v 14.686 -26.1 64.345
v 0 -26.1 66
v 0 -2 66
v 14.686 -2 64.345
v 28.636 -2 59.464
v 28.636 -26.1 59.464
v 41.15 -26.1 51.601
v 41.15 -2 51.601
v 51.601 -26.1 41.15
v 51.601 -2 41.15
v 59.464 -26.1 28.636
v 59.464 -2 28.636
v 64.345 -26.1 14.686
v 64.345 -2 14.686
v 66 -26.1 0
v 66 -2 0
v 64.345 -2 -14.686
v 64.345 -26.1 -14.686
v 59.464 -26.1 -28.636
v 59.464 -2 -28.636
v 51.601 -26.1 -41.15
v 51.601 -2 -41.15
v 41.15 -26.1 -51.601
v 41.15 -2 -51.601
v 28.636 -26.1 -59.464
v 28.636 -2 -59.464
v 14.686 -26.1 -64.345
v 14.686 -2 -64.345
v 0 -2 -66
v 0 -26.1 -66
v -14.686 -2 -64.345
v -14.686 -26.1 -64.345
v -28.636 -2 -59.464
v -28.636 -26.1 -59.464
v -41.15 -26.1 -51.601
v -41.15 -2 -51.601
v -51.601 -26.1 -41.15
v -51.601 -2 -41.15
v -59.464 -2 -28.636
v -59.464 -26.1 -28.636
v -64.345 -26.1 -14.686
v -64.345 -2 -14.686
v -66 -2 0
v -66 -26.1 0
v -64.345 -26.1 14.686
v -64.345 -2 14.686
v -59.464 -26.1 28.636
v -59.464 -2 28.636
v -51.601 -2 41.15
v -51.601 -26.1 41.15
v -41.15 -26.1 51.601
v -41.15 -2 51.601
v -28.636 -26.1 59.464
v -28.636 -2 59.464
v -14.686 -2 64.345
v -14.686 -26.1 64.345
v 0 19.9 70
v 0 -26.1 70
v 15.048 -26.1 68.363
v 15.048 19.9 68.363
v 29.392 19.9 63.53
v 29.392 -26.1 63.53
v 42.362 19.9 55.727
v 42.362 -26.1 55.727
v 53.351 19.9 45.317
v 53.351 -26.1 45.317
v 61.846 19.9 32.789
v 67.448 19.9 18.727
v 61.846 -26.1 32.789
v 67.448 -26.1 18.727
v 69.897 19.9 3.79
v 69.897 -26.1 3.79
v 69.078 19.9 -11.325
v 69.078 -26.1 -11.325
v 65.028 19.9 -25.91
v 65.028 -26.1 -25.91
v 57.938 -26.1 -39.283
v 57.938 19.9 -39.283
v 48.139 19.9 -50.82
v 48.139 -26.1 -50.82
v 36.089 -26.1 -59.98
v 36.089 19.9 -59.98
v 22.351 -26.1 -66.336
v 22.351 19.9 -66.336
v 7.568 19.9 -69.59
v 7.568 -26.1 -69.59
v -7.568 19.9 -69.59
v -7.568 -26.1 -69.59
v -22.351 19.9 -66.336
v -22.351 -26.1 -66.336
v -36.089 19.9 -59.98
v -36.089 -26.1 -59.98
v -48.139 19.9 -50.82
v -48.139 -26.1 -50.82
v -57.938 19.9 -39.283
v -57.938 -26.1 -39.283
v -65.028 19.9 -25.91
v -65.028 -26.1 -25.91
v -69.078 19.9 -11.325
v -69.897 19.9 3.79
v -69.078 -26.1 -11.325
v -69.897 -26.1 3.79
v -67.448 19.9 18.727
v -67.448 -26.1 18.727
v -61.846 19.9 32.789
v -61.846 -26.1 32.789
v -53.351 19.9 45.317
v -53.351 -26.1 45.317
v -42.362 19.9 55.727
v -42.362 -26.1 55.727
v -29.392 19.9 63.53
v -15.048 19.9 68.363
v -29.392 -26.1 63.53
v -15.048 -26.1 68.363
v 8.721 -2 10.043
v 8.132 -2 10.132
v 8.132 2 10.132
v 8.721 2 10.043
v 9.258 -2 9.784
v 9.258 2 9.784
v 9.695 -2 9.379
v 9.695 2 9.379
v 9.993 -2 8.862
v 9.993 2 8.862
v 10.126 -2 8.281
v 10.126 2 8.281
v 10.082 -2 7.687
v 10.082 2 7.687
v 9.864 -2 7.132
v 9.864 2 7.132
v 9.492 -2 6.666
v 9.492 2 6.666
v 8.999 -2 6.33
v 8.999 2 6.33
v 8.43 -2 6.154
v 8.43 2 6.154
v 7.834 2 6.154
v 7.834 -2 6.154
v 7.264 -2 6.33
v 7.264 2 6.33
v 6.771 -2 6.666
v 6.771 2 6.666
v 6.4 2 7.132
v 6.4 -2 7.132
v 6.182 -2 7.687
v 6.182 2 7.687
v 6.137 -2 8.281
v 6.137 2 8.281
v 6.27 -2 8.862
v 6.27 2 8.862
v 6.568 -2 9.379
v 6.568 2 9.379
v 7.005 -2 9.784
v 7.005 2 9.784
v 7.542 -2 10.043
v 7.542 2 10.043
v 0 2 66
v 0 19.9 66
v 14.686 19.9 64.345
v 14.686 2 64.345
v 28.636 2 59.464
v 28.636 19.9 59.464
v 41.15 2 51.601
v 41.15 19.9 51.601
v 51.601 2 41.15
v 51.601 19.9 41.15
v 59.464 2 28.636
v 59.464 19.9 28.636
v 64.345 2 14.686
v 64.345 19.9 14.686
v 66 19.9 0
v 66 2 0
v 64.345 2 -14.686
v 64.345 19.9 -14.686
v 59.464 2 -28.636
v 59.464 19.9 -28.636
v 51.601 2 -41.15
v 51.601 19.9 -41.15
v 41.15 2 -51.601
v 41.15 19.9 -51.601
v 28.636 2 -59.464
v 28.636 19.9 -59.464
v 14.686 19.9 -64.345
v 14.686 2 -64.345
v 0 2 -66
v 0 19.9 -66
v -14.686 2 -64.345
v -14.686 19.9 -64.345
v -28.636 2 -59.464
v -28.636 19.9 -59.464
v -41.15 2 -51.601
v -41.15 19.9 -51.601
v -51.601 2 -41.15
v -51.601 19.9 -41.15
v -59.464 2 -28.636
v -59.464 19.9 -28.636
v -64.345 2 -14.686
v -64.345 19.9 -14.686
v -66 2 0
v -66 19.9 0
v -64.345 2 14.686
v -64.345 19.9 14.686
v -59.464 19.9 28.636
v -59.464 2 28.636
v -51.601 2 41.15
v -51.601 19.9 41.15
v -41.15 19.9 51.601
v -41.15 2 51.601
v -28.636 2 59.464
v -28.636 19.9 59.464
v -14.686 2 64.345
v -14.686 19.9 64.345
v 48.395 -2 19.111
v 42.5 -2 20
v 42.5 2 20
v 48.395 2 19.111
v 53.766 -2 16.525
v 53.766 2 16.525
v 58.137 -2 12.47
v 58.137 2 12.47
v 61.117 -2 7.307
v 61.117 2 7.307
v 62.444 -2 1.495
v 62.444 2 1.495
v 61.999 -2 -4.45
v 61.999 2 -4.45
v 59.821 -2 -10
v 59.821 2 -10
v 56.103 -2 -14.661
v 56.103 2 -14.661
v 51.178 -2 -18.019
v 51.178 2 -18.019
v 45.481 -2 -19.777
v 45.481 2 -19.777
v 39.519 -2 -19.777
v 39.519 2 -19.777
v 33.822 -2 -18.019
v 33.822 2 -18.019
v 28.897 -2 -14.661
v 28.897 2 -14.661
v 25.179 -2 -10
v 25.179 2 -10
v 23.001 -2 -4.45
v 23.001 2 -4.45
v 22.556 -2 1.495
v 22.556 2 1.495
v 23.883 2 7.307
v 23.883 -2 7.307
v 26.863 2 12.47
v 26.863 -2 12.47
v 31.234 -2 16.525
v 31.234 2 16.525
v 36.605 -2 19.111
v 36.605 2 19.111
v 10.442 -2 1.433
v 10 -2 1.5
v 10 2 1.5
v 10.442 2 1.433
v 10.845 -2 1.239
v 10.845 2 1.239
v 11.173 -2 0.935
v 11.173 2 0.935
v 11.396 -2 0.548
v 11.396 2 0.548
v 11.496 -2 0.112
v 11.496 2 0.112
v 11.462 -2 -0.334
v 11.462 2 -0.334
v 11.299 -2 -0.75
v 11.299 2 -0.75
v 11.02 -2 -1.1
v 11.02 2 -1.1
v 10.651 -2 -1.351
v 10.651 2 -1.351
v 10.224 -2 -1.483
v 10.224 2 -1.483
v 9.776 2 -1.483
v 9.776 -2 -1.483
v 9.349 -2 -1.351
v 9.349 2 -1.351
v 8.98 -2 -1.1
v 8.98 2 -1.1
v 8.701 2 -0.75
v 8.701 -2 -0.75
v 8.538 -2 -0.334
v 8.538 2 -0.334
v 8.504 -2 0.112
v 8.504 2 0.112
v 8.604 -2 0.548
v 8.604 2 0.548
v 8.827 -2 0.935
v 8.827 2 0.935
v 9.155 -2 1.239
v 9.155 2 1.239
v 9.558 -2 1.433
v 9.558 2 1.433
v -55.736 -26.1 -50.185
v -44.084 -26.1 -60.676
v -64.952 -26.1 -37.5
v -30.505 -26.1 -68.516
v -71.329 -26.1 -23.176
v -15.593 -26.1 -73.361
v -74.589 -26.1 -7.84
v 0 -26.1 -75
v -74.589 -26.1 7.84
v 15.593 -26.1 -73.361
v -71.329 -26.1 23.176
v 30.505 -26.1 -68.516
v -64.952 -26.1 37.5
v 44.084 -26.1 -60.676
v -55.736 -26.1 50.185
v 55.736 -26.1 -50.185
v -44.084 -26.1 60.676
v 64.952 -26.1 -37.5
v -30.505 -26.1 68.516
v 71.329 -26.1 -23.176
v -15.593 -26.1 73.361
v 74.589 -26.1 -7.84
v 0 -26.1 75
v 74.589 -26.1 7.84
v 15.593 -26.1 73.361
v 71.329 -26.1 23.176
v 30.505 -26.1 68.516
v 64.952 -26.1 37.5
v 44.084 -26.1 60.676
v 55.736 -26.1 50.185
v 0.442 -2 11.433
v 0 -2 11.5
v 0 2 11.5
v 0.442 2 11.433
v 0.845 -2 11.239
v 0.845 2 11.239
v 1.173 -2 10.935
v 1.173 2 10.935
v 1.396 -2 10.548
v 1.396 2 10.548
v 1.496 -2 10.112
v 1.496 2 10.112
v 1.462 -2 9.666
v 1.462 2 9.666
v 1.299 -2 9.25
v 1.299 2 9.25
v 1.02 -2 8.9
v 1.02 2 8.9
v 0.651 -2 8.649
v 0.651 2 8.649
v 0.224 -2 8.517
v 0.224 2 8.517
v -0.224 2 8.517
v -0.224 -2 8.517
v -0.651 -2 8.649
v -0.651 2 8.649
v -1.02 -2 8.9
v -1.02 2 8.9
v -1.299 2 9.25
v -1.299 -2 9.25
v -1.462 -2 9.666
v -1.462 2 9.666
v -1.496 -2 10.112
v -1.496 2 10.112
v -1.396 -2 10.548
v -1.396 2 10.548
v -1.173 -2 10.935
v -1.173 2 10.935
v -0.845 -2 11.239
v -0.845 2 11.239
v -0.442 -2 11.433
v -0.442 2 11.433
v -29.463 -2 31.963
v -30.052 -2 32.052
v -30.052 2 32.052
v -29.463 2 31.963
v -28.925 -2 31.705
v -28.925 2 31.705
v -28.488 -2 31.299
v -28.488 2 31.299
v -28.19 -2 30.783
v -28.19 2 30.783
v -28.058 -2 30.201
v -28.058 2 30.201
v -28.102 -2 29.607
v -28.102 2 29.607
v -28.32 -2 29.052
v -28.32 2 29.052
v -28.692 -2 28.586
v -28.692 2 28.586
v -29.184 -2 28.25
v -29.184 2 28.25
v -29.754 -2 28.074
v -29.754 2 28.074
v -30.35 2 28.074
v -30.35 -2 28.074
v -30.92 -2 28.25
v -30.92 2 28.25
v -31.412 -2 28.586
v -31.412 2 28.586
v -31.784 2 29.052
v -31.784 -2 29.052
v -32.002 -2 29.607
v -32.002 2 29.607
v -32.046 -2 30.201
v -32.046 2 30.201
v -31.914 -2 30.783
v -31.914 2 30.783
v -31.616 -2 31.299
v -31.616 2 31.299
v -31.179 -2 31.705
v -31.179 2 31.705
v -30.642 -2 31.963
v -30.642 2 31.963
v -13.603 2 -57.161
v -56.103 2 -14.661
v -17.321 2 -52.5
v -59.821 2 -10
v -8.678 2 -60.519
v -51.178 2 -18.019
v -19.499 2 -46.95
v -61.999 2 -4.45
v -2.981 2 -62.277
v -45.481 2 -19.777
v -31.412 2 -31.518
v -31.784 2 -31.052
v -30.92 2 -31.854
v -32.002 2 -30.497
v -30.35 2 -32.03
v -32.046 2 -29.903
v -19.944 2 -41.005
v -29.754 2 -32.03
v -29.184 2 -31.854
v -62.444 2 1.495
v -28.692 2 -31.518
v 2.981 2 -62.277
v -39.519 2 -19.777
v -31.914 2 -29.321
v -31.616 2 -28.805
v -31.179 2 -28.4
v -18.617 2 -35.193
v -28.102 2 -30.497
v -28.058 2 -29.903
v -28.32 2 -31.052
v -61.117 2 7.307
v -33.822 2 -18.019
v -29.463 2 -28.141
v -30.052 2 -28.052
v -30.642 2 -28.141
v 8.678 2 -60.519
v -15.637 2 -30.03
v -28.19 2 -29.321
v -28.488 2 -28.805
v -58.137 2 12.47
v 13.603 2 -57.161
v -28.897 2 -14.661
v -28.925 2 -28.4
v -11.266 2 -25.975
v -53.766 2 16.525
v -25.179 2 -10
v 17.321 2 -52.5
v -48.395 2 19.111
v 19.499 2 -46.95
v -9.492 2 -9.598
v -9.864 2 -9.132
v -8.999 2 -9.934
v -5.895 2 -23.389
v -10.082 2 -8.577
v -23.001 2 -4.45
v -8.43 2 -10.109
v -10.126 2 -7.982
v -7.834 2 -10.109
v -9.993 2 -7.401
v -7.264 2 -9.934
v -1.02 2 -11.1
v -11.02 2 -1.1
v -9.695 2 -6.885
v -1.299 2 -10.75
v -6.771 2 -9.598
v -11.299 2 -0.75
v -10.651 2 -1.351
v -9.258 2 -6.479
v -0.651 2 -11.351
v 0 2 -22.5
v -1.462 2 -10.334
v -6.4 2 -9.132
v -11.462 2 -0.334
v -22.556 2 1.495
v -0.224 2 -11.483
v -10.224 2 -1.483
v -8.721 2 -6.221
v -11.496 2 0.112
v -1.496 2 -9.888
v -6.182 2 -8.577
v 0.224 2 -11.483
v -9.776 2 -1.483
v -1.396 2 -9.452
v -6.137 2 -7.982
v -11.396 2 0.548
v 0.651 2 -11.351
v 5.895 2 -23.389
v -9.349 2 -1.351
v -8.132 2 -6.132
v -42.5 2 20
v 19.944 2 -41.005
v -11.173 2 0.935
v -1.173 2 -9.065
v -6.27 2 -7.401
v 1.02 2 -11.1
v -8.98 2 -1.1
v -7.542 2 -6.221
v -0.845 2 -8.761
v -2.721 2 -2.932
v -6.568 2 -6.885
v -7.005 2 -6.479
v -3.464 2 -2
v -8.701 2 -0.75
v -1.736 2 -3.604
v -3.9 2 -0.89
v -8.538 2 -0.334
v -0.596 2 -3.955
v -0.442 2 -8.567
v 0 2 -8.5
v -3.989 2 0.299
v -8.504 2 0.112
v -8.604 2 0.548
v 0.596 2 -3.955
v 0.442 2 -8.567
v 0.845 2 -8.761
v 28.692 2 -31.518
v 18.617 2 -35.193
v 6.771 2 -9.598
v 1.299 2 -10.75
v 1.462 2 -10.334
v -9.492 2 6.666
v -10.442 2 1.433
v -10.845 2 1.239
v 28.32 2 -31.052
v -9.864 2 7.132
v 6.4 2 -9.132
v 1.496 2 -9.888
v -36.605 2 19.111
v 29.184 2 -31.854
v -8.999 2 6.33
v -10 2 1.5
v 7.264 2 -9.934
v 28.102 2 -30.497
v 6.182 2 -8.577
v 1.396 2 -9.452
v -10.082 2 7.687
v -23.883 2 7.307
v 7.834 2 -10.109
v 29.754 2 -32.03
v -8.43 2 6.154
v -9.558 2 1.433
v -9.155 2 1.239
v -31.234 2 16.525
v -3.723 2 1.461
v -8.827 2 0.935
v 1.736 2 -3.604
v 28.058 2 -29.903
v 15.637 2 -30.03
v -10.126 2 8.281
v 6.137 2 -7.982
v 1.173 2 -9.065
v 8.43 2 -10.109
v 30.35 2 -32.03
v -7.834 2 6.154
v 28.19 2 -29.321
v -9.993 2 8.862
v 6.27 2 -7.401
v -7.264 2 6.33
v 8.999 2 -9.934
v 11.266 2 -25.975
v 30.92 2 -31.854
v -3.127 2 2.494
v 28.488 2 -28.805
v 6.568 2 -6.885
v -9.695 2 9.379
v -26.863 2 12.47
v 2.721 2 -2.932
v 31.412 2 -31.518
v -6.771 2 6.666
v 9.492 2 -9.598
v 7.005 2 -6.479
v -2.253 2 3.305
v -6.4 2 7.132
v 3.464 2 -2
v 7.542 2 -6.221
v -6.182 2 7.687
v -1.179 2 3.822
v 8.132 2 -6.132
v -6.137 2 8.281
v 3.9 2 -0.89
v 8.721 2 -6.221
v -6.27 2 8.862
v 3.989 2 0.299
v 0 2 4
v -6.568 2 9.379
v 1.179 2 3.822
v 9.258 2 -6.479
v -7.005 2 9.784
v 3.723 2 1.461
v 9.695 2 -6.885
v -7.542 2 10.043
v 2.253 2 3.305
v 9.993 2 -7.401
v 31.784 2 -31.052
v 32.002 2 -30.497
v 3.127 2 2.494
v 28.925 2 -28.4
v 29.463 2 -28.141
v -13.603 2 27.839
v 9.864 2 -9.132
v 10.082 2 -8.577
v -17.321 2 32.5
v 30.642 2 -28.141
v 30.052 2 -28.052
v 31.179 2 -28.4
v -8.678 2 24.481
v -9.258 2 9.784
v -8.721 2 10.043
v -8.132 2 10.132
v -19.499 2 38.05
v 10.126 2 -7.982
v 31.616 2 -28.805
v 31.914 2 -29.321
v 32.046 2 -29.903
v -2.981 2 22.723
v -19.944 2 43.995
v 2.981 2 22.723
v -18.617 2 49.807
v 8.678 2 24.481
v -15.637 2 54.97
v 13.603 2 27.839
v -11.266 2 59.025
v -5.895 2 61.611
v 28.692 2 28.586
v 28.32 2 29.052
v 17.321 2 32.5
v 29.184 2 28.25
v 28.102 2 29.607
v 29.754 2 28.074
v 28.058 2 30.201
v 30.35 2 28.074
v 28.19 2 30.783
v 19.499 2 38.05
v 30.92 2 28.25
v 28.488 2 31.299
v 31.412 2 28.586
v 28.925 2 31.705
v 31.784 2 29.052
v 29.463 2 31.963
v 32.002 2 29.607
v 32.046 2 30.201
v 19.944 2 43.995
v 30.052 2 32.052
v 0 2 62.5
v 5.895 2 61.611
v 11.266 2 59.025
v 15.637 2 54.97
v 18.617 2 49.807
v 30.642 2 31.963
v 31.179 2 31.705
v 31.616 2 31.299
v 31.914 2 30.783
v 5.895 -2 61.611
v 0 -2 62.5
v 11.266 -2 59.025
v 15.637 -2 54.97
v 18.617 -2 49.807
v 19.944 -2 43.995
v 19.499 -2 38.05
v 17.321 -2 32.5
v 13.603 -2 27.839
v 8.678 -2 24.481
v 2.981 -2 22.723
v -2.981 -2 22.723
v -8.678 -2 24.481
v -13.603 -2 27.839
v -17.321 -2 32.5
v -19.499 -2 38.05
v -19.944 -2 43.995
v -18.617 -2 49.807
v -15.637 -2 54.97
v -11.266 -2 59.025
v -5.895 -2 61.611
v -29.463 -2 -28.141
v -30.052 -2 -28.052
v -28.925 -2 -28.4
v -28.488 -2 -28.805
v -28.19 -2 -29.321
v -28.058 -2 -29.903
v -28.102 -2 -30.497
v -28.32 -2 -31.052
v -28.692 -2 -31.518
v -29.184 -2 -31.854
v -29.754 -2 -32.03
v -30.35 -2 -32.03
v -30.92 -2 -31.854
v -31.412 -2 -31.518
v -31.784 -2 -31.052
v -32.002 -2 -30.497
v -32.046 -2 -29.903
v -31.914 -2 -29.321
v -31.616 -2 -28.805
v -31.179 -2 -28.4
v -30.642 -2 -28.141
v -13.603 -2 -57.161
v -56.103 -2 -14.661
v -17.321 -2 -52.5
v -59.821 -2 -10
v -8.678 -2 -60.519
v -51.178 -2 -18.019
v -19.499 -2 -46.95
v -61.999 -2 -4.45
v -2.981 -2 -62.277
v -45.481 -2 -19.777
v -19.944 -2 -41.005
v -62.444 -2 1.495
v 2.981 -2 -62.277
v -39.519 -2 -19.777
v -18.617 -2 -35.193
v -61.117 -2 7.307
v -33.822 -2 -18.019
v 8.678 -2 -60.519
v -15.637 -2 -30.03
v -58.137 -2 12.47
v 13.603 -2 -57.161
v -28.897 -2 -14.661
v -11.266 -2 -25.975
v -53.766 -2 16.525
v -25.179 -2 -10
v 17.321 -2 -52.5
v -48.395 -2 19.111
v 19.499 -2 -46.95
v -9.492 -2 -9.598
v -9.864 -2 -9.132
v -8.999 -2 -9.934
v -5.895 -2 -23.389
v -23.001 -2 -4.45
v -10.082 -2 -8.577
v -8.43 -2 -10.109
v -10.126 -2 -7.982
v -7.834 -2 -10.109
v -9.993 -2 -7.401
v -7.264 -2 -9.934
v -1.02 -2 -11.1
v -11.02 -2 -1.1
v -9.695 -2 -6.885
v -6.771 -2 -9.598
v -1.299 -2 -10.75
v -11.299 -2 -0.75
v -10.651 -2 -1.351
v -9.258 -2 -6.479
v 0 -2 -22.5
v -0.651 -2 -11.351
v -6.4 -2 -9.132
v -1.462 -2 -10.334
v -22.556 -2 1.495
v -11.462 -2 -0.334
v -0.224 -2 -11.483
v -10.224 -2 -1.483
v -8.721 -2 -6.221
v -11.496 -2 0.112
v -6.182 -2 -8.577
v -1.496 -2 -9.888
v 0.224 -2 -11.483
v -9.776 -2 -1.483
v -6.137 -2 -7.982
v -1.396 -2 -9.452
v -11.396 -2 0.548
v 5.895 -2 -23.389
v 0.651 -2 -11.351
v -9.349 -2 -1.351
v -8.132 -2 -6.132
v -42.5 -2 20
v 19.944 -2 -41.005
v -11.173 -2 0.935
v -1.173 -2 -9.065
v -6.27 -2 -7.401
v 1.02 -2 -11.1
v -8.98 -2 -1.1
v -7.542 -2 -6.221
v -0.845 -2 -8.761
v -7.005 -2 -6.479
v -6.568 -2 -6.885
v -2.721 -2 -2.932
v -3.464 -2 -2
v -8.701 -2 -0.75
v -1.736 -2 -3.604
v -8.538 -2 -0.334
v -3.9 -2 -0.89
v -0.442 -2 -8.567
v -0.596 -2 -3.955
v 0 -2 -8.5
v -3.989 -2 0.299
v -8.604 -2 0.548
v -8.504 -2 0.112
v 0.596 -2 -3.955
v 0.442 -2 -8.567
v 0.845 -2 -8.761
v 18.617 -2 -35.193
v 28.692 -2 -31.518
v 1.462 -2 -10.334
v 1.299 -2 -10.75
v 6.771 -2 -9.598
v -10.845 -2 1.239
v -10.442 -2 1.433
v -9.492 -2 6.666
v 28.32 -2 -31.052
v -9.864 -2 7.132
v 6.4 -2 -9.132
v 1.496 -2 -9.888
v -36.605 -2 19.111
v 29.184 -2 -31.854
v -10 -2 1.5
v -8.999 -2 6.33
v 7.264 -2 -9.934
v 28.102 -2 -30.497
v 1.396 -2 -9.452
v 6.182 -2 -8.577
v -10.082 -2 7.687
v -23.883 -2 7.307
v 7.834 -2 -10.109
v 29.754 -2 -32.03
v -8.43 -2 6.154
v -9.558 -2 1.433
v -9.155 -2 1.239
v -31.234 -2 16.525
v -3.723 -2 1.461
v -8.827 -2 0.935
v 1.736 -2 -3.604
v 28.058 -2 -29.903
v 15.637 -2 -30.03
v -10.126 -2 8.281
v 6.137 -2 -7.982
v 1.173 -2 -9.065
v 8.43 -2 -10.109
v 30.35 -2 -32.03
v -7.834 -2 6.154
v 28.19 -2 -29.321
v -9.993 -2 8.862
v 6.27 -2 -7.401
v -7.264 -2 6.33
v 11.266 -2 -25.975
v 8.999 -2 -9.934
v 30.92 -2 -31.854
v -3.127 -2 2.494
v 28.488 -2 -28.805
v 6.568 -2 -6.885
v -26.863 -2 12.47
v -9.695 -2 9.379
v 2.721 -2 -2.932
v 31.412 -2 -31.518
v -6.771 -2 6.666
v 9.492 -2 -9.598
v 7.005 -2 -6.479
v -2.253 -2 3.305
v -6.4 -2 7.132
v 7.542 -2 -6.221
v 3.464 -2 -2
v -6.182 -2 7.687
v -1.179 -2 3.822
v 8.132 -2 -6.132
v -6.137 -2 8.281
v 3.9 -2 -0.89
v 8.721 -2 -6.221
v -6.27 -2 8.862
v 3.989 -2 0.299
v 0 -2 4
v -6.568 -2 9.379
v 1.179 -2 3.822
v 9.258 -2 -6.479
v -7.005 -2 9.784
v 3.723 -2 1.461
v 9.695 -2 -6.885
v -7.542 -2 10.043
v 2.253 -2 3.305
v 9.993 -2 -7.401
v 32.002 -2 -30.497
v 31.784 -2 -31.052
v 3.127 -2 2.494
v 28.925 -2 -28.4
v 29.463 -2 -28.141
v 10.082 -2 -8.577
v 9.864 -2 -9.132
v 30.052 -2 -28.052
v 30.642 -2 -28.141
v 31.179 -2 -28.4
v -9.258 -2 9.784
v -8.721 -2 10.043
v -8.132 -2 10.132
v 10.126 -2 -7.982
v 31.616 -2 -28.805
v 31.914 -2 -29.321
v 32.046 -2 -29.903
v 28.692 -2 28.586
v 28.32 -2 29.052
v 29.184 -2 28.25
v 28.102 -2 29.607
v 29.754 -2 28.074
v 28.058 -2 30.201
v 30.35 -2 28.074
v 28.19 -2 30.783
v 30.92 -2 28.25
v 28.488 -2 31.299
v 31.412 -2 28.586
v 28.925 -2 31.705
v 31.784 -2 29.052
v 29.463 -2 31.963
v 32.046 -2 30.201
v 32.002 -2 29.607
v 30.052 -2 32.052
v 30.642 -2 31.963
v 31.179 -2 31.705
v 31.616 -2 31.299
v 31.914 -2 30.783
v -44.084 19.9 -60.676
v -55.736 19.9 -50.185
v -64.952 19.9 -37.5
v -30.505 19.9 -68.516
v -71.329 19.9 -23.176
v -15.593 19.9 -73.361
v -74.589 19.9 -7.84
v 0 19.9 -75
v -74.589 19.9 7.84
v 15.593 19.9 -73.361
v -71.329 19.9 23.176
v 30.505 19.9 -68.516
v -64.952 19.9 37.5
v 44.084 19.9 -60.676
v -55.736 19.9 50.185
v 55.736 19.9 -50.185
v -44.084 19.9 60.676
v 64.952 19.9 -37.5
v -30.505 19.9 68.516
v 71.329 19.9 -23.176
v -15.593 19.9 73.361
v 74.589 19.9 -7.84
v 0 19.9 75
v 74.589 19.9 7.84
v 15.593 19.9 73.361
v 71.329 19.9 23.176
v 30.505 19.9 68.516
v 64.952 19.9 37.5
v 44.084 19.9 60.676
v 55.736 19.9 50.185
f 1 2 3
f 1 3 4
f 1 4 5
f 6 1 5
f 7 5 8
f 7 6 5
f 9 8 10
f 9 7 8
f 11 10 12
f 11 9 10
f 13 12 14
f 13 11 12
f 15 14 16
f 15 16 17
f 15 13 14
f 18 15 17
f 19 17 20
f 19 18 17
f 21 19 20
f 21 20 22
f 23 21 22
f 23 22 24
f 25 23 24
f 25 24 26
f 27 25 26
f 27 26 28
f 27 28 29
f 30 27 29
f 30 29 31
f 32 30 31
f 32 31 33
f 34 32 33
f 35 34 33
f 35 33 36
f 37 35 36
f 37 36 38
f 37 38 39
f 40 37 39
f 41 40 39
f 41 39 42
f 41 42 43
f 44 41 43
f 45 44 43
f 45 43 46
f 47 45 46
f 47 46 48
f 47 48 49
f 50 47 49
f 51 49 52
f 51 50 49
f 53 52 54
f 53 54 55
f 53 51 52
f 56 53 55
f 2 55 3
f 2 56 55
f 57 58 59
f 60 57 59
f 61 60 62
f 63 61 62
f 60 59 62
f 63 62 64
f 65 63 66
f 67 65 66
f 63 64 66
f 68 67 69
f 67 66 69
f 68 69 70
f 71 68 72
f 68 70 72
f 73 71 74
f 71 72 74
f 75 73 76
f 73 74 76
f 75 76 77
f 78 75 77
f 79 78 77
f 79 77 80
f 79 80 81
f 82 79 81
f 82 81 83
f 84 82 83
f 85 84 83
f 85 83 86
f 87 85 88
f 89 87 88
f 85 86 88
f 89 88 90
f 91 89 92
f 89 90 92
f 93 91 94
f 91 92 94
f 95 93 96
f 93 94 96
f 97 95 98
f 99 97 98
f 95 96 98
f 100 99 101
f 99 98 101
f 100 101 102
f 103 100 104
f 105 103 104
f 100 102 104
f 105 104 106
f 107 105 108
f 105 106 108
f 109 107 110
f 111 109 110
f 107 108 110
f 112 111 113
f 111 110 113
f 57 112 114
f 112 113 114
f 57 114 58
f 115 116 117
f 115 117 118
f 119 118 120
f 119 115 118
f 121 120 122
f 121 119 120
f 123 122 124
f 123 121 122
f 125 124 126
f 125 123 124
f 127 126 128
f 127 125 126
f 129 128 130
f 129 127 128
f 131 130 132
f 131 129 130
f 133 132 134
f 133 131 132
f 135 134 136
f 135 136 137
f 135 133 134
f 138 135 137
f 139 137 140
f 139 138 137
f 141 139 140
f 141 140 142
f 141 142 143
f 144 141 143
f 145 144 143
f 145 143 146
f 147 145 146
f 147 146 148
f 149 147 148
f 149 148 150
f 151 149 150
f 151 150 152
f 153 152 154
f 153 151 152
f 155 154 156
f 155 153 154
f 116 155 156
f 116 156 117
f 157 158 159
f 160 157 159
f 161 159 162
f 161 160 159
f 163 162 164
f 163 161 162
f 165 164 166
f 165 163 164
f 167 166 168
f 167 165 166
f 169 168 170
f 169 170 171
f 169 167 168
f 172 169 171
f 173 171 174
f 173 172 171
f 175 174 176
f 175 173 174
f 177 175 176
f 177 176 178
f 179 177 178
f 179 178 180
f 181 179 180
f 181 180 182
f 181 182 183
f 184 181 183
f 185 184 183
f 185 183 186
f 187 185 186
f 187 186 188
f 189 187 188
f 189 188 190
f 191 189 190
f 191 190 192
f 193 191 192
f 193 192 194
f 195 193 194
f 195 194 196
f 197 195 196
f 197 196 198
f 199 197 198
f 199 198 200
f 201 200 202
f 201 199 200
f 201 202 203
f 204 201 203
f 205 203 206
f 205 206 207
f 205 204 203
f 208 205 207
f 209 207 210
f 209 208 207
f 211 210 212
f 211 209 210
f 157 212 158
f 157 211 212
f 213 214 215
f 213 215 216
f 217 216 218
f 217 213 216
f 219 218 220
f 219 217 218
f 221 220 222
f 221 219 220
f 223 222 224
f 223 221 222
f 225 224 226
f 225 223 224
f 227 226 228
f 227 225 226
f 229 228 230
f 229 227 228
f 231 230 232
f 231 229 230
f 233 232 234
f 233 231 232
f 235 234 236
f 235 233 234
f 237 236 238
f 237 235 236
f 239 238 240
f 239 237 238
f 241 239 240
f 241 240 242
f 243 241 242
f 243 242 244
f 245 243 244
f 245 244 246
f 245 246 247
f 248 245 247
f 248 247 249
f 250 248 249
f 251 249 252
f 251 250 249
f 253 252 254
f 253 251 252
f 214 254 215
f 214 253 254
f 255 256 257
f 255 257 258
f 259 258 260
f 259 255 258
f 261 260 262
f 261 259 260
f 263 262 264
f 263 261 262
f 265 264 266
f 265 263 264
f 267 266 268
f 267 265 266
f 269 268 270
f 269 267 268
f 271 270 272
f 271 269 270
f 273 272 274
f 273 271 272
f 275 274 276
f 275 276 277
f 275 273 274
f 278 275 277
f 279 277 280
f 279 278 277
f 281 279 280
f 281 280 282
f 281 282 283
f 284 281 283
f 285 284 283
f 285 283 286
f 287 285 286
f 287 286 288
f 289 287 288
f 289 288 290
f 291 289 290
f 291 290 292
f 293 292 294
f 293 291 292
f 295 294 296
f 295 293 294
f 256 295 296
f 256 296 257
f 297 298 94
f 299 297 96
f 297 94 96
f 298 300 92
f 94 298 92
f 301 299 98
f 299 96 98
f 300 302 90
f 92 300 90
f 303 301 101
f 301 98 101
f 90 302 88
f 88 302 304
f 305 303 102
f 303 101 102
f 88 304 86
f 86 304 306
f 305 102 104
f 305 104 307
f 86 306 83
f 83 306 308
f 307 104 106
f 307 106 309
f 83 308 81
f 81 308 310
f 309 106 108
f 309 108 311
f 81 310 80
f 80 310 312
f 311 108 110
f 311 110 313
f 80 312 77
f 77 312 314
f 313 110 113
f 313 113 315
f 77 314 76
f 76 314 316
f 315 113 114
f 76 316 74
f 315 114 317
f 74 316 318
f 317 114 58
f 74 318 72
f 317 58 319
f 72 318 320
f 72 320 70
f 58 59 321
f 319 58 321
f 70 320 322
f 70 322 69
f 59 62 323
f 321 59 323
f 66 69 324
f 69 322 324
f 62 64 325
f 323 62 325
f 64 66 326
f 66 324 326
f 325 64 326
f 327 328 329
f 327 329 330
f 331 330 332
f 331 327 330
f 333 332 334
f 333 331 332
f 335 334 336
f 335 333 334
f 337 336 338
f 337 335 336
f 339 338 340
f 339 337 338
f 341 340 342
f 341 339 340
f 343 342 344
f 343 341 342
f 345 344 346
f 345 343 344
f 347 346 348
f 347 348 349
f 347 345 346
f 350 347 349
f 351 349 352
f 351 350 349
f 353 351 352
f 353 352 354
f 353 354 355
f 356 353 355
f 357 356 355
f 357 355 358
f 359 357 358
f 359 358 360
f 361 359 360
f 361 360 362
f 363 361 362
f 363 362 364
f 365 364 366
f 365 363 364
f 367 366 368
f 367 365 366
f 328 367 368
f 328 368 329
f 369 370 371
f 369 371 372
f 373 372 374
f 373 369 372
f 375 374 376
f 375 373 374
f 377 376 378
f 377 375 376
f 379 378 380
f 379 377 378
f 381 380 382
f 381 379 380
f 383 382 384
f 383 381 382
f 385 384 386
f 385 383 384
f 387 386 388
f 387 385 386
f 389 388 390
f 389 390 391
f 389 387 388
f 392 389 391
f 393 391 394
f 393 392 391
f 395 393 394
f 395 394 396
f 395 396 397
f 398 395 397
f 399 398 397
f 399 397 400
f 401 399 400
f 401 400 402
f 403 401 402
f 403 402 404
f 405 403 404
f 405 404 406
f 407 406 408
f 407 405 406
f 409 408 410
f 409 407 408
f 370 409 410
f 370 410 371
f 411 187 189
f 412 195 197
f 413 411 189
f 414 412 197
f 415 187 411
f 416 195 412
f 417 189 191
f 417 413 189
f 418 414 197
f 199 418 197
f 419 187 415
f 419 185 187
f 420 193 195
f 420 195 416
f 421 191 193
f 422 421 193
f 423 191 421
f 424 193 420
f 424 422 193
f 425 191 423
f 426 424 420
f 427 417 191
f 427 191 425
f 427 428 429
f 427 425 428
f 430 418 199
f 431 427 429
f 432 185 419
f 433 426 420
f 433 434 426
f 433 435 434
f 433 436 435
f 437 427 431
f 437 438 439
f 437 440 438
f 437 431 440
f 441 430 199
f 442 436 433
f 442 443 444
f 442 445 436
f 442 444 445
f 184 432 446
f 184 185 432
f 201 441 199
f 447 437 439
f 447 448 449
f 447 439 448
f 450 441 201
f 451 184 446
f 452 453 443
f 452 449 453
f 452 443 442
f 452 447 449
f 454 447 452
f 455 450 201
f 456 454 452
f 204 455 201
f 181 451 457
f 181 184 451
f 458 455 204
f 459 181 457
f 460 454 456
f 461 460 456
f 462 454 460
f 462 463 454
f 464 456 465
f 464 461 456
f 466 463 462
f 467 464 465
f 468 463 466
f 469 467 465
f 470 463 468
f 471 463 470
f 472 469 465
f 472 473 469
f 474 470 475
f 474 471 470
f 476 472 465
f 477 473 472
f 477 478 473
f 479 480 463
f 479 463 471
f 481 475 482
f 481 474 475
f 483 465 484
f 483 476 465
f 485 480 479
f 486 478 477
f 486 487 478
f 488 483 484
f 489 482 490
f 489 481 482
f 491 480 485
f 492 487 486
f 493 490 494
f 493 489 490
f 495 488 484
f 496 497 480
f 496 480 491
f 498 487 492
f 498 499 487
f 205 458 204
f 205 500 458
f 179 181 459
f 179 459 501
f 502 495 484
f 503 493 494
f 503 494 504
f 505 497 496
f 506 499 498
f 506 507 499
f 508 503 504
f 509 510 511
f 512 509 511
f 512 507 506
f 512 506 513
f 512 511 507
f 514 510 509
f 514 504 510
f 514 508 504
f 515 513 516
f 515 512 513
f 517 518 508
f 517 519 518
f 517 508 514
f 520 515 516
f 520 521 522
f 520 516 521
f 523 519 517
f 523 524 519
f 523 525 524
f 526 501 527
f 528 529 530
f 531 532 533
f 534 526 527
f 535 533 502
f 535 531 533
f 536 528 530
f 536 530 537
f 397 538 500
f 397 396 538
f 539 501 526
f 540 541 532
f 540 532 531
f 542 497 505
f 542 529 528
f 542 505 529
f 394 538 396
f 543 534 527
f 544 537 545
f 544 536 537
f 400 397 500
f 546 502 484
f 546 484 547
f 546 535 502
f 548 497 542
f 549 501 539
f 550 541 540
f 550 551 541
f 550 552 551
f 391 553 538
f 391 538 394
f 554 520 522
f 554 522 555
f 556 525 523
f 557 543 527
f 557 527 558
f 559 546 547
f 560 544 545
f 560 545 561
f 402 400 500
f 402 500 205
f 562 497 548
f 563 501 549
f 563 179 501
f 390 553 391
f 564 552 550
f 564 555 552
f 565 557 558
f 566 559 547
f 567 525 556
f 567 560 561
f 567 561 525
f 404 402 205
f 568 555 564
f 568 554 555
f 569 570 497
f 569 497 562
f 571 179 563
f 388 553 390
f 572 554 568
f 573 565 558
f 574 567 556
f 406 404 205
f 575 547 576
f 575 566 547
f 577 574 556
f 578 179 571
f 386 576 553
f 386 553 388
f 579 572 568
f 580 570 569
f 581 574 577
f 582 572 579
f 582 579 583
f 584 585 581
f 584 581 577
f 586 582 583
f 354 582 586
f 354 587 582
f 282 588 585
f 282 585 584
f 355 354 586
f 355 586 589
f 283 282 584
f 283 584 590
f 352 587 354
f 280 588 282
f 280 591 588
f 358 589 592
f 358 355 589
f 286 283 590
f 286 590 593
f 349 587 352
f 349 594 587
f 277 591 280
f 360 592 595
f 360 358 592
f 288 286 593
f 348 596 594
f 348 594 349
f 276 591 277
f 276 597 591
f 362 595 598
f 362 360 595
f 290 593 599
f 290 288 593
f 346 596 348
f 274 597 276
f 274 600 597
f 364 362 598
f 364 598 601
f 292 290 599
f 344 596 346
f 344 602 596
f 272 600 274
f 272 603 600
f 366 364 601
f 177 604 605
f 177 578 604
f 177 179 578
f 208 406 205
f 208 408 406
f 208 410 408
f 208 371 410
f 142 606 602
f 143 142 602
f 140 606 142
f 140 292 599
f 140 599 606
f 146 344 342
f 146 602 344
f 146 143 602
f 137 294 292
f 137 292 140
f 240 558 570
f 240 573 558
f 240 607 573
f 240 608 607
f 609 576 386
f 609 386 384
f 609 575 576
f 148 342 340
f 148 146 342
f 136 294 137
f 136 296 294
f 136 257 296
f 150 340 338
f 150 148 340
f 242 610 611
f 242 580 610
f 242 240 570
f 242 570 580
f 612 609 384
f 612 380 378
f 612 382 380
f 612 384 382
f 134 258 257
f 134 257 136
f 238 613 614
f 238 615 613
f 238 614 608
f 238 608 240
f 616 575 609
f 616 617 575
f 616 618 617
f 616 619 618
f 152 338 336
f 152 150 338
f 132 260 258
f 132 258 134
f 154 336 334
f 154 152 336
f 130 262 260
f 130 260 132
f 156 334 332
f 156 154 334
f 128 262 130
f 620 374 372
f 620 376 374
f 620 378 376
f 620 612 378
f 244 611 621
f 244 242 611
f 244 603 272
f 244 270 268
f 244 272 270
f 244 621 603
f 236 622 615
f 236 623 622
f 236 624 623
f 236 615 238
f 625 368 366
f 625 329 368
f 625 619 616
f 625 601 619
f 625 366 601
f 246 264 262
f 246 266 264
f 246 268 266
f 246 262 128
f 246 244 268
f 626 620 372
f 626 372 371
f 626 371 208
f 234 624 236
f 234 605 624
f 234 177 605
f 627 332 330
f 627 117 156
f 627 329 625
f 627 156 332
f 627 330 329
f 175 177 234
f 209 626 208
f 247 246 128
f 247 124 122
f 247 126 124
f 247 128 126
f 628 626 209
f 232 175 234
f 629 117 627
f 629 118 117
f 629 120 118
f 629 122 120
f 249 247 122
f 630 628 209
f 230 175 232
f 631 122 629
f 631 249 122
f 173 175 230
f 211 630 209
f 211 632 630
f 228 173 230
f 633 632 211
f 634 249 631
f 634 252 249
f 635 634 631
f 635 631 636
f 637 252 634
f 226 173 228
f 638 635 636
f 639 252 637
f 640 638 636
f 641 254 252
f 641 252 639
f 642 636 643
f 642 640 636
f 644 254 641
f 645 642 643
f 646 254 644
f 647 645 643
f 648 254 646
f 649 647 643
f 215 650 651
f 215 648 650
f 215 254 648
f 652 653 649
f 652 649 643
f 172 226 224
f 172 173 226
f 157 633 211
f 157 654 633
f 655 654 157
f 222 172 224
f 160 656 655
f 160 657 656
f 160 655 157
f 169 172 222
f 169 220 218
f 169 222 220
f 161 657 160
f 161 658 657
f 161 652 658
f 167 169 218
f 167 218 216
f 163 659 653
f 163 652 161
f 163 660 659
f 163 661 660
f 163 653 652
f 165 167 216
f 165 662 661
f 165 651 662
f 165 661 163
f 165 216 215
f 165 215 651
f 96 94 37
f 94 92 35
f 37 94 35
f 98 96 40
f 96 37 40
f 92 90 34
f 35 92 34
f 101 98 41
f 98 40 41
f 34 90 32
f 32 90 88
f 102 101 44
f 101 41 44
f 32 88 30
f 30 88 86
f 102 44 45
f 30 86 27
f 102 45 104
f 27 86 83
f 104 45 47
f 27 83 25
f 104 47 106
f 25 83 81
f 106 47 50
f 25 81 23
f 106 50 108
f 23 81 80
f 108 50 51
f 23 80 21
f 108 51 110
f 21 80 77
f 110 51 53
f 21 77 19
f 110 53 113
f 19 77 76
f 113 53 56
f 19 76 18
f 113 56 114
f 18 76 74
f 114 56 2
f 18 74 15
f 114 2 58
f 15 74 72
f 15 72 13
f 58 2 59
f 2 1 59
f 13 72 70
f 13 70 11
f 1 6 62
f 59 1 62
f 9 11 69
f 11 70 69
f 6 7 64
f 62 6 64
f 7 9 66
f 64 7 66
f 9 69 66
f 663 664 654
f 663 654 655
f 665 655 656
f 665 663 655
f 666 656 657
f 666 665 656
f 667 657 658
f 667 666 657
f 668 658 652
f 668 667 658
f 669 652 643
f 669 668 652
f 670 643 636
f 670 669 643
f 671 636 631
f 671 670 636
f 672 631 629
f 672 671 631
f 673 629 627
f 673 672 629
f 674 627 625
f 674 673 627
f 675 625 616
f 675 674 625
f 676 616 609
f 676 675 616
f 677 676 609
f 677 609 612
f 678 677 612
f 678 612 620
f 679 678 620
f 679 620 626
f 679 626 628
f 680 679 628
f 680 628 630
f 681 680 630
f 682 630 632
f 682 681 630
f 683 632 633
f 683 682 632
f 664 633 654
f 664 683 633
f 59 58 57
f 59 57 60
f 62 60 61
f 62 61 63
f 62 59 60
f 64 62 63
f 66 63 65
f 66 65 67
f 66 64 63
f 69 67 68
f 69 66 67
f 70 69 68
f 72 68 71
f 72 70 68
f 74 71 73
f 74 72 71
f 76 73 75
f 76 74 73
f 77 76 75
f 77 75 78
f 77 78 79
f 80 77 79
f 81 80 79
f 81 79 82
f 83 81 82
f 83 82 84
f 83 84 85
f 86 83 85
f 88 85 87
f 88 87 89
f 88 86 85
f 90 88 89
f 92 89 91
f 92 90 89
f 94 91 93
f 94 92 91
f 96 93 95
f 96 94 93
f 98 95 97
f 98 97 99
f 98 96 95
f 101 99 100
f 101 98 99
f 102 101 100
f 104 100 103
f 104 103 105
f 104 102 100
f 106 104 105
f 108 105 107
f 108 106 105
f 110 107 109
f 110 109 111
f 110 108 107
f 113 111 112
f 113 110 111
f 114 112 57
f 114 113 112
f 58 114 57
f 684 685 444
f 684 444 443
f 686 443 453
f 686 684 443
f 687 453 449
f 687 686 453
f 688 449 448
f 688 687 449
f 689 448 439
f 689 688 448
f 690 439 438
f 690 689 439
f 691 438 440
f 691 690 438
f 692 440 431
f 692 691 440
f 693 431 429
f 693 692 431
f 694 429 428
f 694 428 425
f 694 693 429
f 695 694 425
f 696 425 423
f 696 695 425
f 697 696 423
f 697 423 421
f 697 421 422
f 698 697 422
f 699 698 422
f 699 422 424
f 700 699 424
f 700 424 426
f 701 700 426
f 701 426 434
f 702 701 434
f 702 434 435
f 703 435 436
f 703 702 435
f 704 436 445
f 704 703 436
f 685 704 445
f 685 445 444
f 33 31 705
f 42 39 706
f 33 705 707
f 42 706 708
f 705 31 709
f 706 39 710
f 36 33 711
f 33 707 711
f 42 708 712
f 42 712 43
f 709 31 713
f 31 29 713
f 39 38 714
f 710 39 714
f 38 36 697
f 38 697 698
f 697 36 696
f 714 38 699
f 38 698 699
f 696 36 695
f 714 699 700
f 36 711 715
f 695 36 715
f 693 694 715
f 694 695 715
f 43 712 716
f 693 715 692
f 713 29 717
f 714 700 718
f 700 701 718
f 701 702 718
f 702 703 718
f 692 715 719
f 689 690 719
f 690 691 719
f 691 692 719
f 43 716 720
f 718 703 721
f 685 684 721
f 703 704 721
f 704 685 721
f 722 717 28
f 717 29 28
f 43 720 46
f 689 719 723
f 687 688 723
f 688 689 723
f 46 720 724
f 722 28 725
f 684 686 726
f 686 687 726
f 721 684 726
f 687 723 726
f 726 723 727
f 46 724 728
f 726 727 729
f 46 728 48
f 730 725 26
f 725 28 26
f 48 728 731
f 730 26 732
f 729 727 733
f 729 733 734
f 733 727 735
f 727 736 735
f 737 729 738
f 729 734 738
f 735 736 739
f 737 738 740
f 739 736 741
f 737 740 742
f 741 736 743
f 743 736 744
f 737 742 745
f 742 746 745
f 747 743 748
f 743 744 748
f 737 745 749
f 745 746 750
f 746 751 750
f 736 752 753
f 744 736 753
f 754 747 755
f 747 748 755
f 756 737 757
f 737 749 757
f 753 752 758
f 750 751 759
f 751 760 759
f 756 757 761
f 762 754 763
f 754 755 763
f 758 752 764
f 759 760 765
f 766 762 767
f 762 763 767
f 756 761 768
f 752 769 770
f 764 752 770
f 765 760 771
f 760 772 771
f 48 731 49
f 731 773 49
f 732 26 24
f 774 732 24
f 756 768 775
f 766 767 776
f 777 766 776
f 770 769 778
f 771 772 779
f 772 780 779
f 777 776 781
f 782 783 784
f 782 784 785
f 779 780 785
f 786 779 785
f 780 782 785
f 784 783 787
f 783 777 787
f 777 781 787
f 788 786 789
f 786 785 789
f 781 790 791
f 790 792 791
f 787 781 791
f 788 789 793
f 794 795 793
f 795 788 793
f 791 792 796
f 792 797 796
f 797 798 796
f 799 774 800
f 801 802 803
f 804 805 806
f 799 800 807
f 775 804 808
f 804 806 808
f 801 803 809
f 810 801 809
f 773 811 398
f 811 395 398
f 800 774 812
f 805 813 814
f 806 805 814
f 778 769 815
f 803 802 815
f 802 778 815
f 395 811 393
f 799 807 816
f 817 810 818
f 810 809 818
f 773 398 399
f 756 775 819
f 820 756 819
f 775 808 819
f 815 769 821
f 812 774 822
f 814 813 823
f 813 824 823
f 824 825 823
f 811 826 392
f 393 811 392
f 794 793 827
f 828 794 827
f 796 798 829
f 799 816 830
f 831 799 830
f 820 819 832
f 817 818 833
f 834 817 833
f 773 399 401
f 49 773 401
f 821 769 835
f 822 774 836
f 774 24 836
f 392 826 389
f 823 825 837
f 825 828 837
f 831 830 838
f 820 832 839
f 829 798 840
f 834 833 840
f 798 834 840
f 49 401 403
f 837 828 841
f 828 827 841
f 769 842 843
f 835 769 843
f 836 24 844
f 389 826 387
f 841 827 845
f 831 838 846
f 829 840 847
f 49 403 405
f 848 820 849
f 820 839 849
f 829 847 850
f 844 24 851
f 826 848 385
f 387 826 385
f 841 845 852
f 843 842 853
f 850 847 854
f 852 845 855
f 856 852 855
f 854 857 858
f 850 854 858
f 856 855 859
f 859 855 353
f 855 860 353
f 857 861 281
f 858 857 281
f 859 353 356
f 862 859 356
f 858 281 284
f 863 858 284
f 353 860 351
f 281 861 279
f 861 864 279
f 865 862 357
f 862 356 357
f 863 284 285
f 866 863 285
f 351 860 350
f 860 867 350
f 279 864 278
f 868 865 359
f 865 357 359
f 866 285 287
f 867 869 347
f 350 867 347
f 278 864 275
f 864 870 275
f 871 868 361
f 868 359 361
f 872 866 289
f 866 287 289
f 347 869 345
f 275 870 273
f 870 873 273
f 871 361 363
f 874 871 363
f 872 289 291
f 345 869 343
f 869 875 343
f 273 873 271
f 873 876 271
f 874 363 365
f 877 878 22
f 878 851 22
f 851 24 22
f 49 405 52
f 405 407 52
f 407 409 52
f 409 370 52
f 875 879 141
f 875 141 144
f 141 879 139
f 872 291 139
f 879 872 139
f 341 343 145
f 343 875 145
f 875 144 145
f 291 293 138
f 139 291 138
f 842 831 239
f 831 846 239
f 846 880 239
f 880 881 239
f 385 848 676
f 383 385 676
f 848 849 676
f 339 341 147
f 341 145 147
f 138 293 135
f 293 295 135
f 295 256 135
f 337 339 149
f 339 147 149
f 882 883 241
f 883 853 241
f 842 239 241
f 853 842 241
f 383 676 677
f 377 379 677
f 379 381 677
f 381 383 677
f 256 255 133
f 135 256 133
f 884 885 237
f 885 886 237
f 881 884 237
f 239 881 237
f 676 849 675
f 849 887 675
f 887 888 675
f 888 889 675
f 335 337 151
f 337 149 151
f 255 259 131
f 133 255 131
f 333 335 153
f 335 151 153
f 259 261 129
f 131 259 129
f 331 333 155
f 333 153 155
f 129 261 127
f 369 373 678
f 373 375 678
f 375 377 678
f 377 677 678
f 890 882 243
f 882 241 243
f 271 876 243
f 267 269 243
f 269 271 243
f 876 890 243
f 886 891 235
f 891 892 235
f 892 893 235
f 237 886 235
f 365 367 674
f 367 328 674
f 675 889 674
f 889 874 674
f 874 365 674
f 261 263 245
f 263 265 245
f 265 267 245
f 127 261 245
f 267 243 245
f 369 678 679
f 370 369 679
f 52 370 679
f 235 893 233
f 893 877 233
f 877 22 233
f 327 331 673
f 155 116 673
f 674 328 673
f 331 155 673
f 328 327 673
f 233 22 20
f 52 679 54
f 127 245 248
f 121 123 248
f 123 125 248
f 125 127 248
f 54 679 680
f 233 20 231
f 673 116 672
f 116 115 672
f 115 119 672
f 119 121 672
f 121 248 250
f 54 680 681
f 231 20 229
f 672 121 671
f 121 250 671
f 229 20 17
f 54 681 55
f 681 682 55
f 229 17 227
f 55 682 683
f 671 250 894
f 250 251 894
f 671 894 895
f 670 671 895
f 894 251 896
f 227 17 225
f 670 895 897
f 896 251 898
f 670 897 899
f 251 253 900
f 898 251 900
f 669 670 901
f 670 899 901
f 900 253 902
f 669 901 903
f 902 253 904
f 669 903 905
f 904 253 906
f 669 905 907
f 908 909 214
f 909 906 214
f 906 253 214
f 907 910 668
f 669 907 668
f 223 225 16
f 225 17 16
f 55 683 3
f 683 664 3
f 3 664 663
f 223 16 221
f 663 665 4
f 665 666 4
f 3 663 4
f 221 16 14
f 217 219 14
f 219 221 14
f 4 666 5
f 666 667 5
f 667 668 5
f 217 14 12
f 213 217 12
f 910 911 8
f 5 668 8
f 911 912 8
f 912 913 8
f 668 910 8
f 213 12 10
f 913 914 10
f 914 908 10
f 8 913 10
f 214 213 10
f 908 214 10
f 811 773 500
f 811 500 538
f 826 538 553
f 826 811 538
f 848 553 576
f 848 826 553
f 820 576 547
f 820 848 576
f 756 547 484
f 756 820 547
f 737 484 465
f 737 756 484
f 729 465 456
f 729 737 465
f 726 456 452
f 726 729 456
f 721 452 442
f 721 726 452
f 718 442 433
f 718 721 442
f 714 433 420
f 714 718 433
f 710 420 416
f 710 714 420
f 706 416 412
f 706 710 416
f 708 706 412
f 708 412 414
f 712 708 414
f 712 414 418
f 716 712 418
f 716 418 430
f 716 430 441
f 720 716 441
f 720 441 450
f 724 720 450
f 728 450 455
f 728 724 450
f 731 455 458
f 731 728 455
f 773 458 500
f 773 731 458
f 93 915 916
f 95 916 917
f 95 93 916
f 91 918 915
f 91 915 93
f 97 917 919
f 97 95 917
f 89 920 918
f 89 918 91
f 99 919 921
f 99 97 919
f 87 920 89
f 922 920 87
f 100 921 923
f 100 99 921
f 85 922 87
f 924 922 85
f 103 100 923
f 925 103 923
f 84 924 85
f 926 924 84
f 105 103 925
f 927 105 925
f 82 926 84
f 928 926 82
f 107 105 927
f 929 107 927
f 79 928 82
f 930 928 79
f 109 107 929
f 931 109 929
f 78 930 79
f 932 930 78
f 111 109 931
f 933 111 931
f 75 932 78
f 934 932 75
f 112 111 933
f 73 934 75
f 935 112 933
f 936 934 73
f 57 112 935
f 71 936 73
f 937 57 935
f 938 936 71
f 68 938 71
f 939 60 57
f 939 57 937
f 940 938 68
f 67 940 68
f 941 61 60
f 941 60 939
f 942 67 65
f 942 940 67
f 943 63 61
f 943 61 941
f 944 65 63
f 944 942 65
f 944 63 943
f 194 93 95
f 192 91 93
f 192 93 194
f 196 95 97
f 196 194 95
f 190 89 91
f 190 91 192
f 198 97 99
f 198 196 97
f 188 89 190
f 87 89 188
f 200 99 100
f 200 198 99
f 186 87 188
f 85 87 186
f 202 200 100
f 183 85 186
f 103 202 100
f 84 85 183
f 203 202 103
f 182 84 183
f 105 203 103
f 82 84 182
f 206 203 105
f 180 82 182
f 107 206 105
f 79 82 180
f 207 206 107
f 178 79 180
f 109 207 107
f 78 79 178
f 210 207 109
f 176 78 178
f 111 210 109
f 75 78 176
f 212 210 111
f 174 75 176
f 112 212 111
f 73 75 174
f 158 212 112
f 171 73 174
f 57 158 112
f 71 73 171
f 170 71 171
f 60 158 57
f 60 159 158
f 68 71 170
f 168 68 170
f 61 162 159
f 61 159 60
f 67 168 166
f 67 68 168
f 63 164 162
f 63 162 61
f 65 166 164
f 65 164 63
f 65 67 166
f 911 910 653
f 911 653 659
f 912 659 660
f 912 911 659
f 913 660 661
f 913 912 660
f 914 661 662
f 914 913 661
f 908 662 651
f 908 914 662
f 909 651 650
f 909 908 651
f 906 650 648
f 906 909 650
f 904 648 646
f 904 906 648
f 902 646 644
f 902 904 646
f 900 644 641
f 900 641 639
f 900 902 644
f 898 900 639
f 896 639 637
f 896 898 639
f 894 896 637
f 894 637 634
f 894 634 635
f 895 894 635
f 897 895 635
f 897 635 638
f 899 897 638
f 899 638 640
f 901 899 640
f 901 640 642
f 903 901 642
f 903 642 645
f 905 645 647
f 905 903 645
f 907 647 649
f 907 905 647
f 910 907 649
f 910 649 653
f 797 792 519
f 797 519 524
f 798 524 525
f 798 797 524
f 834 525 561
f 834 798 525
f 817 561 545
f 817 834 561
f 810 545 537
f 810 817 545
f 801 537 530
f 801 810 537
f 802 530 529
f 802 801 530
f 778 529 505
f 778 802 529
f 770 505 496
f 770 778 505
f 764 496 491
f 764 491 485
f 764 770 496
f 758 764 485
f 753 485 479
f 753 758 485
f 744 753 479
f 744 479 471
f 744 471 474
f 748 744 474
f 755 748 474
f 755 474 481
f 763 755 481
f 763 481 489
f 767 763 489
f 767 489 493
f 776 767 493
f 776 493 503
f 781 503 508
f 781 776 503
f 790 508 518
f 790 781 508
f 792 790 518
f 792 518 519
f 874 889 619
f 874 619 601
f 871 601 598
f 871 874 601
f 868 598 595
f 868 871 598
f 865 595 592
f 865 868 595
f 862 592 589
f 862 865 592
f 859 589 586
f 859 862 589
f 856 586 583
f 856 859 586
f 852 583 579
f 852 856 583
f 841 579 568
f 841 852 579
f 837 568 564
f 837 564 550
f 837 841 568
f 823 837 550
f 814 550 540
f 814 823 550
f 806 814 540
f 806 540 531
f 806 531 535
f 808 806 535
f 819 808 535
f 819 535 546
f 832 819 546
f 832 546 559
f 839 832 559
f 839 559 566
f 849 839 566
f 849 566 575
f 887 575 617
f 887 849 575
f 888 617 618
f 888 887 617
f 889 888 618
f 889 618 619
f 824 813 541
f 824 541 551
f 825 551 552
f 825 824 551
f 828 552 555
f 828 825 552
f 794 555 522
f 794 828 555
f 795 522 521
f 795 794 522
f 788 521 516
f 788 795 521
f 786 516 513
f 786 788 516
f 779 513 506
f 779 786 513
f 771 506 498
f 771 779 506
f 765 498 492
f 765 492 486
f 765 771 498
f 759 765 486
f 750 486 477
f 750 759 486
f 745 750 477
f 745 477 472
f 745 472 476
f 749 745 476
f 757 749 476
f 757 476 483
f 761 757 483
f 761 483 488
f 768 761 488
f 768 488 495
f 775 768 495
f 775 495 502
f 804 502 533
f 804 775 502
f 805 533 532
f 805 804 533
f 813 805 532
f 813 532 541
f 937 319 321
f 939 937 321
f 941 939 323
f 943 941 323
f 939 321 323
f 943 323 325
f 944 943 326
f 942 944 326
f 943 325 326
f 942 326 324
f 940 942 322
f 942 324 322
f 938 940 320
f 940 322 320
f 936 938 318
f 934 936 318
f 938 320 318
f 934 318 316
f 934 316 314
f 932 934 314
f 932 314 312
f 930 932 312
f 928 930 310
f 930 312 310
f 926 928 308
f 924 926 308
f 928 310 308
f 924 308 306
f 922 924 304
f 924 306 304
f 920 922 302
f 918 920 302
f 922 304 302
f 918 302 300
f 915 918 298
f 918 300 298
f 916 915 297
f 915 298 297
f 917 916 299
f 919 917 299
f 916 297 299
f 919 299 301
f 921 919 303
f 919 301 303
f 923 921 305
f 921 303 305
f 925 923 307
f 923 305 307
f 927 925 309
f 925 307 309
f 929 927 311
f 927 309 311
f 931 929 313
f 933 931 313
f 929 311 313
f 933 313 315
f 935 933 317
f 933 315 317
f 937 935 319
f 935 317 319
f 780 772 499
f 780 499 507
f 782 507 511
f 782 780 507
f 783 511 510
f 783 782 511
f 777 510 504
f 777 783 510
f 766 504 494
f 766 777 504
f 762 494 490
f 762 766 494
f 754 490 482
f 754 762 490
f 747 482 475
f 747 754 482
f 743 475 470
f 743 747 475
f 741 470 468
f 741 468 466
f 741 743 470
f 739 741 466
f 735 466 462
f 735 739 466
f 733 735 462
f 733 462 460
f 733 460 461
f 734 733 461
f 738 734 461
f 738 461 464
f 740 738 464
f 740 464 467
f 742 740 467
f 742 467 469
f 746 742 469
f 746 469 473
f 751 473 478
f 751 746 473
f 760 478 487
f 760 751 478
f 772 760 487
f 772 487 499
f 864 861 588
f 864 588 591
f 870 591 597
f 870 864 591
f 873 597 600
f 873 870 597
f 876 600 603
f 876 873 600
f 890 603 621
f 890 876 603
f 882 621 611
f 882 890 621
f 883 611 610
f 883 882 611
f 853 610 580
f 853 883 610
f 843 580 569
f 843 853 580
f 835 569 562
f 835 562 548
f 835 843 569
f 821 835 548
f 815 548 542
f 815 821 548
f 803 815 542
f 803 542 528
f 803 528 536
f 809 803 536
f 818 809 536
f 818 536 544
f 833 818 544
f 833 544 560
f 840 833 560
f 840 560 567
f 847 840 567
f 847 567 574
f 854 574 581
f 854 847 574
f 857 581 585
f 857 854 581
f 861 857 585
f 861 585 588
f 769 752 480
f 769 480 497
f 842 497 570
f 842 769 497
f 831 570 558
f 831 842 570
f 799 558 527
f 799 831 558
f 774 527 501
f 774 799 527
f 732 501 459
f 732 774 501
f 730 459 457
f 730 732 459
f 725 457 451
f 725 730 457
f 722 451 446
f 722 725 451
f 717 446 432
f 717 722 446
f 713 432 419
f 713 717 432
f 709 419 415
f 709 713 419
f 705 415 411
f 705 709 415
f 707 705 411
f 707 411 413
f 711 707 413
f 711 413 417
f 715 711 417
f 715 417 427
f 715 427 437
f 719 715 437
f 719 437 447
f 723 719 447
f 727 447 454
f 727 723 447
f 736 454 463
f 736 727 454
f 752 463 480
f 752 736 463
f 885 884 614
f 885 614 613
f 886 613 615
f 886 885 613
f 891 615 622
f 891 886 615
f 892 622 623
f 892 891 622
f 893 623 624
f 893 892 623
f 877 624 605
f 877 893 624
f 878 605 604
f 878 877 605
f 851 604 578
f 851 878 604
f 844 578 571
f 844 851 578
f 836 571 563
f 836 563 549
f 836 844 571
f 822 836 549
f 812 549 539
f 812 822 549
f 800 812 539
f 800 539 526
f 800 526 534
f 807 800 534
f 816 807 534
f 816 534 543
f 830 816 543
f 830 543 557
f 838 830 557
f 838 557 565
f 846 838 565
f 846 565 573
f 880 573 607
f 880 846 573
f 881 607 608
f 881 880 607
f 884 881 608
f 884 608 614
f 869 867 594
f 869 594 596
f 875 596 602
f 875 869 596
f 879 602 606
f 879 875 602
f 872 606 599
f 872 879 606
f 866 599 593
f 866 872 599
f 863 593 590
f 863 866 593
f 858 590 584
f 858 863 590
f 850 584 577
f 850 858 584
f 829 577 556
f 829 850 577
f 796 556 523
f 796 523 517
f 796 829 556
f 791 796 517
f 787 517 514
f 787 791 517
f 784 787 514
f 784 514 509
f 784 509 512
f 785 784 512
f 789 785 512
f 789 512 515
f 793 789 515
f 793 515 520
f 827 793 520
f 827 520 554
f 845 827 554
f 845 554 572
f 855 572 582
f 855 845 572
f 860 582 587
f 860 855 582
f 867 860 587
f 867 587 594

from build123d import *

# Parameters (mm, degrees)
BOSS_EXTRUDE1_DEPTH      = 2
BOSS_EXTRUDE1_DEPTH_BACK = 2
SKETCH1_R                = 66
SKETCH1_R_2              = 2
SKETCH1_R_3              = 20
SKETCH1_R_4              = 1.5
SKETCH1_R_5              = 4
BOSS_EXTRUDE2_DEPTH      = 19.9
BOSS_EXTRUDE2_DEPTH_BACK = 26.1
SKETCH1_3_R              = 70
SKETCH1_3_R_2            = 66
BOSS_EXTRUDE3_DEPTH      = 19.9
BOSS_EXTRUDE3_DEPTH_BACK = 26.1
SKETCH1_4_R              = 75
SKETCH1_4_R_2            = 70


with BuildPart() as part:
    # Sketch1 → Boss-Extrude1 (new, two sides: drawn at the far end of the back side and taken through both)
    with BuildSketch(Plane(origin=(0, 0, 0), x_dir=(1, 0, 0), z_dir=(0, 1, 0)).offset(-BOSS_EXTRUDE1_DEPTH_BACK)):
        Circle(SKETCH1_R)
        with Locations((-30.0520382, -30.0520382)):
            Circle(SKETCH1_R_2, mode=Mode.SUBTRACT)
        with Locations((-8.131667934, -8.131667934)):
            Circle(SKETCH1_R_2, mode=Mode.SUBTRACT)
        with Locations((0, -42.5)):
            Circle(SKETCH1_R_3, mode=Mode.SUBTRACT)
        with Locations((30.0520382, -30.0520382)):
            Circle(SKETCH1_R_2, mode=Mode.SUBTRACT)
        with Locations((0, -10)):
            Circle(SKETCH1_R_4, mode=Mode.SUBTRACT)
        with Locations((8.131667934, -8.131667934)):
            Circle(SKETCH1_R_2, mode=Mode.SUBTRACT)
        with Locations((-42.5, 0)):
            Circle(SKETCH1_R_3, mode=Mode.SUBTRACT)
        with Locations((-10, 0)):
            Circle(SKETCH1_R_4, mode=Mode.SUBTRACT)
        with Locations((-8.131667934, 8.131667934)):
            Circle(SKETCH1_R_2, mode=Mode.SUBTRACT)
        with Locations((-30.0520382, 30.0520382)):
            Circle(SKETCH1_R_2, mode=Mode.SUBTRACT)
        Circle(SKETCH1_R_5, mode=Mode.SUBTRACT)
        with Locations((8.131667934, 8.131667934)):
            Circle(SKETCH1_R_2, mode=Mode.SUBTRACT)
        with Locations((10, 0)):
            Circle(SKETCH1_R_4, mode=Mode.SUBTRACT)
        with Locations((0, 10)):
            Circle(SKETCH1_R_4, mode=Mode.SUBTRACT)
        with Locations((30.0520382, 30.0520382)):
            Circle(SKETCH1_R_2, mode=Mode.SUBTRACT)
        with Locations((42.5, 0)):
            Circle(SKETCH1_R_3, mode=Mode.SUBTRACT)
        with Locations((0, 42.5)):
            Circle(SKETCH1_R_3, mode=Mode.SUBTRACT)
    extrude(amount=BOSS_EXTRUDE1_DEPTH + BOSS_EXTRUDE1_DEPTH_BACK)

    # Sketch1<3> → Boss-Extrude2 (add, two sides: drawn at the far end of the back side and taken through both)
    with BuildSketch(Plane(origin=(0, 0, 0), x_dir=(1, 0, 0), z_dir=(0, 1, 0)).offset(-BOSS_EXTRUDE2_DEPTH_BACK)):
        Circle(SKETCH1_3_R)
        Circle(SKETCH1_3_R_2, mode=Mode.SUBTRACT)
    extrude(amount=BOSS_EXTRUDE2_DEPTH + BOSS_EXTRUDE2_DEPTH_BACK)


with BuildPart() as body_2:
    # Sketch1<4> → Boss-Extrude3 (new, two sides: drawn at the far end of the back side and taken through both)
    with BuildSketch(Plane(origin=(0, 0, 0), x_dir=(1, 0, 0), z_dir=(0, 1, 0)).offset(-BOSS_EXTRUDE3_DEPTH_BACK)):
        Circle(SKETCH1_4_R)
        Circle(SKETCH1_4_R_2, mode=Mode.SUBTRACT)
    extrude(amount=BOSS_EXTRUDE3_DEPTH + BOSS_EXTRUDE3_DEPTH_BACK)


solid = Compound([part.part, body_2.part])
